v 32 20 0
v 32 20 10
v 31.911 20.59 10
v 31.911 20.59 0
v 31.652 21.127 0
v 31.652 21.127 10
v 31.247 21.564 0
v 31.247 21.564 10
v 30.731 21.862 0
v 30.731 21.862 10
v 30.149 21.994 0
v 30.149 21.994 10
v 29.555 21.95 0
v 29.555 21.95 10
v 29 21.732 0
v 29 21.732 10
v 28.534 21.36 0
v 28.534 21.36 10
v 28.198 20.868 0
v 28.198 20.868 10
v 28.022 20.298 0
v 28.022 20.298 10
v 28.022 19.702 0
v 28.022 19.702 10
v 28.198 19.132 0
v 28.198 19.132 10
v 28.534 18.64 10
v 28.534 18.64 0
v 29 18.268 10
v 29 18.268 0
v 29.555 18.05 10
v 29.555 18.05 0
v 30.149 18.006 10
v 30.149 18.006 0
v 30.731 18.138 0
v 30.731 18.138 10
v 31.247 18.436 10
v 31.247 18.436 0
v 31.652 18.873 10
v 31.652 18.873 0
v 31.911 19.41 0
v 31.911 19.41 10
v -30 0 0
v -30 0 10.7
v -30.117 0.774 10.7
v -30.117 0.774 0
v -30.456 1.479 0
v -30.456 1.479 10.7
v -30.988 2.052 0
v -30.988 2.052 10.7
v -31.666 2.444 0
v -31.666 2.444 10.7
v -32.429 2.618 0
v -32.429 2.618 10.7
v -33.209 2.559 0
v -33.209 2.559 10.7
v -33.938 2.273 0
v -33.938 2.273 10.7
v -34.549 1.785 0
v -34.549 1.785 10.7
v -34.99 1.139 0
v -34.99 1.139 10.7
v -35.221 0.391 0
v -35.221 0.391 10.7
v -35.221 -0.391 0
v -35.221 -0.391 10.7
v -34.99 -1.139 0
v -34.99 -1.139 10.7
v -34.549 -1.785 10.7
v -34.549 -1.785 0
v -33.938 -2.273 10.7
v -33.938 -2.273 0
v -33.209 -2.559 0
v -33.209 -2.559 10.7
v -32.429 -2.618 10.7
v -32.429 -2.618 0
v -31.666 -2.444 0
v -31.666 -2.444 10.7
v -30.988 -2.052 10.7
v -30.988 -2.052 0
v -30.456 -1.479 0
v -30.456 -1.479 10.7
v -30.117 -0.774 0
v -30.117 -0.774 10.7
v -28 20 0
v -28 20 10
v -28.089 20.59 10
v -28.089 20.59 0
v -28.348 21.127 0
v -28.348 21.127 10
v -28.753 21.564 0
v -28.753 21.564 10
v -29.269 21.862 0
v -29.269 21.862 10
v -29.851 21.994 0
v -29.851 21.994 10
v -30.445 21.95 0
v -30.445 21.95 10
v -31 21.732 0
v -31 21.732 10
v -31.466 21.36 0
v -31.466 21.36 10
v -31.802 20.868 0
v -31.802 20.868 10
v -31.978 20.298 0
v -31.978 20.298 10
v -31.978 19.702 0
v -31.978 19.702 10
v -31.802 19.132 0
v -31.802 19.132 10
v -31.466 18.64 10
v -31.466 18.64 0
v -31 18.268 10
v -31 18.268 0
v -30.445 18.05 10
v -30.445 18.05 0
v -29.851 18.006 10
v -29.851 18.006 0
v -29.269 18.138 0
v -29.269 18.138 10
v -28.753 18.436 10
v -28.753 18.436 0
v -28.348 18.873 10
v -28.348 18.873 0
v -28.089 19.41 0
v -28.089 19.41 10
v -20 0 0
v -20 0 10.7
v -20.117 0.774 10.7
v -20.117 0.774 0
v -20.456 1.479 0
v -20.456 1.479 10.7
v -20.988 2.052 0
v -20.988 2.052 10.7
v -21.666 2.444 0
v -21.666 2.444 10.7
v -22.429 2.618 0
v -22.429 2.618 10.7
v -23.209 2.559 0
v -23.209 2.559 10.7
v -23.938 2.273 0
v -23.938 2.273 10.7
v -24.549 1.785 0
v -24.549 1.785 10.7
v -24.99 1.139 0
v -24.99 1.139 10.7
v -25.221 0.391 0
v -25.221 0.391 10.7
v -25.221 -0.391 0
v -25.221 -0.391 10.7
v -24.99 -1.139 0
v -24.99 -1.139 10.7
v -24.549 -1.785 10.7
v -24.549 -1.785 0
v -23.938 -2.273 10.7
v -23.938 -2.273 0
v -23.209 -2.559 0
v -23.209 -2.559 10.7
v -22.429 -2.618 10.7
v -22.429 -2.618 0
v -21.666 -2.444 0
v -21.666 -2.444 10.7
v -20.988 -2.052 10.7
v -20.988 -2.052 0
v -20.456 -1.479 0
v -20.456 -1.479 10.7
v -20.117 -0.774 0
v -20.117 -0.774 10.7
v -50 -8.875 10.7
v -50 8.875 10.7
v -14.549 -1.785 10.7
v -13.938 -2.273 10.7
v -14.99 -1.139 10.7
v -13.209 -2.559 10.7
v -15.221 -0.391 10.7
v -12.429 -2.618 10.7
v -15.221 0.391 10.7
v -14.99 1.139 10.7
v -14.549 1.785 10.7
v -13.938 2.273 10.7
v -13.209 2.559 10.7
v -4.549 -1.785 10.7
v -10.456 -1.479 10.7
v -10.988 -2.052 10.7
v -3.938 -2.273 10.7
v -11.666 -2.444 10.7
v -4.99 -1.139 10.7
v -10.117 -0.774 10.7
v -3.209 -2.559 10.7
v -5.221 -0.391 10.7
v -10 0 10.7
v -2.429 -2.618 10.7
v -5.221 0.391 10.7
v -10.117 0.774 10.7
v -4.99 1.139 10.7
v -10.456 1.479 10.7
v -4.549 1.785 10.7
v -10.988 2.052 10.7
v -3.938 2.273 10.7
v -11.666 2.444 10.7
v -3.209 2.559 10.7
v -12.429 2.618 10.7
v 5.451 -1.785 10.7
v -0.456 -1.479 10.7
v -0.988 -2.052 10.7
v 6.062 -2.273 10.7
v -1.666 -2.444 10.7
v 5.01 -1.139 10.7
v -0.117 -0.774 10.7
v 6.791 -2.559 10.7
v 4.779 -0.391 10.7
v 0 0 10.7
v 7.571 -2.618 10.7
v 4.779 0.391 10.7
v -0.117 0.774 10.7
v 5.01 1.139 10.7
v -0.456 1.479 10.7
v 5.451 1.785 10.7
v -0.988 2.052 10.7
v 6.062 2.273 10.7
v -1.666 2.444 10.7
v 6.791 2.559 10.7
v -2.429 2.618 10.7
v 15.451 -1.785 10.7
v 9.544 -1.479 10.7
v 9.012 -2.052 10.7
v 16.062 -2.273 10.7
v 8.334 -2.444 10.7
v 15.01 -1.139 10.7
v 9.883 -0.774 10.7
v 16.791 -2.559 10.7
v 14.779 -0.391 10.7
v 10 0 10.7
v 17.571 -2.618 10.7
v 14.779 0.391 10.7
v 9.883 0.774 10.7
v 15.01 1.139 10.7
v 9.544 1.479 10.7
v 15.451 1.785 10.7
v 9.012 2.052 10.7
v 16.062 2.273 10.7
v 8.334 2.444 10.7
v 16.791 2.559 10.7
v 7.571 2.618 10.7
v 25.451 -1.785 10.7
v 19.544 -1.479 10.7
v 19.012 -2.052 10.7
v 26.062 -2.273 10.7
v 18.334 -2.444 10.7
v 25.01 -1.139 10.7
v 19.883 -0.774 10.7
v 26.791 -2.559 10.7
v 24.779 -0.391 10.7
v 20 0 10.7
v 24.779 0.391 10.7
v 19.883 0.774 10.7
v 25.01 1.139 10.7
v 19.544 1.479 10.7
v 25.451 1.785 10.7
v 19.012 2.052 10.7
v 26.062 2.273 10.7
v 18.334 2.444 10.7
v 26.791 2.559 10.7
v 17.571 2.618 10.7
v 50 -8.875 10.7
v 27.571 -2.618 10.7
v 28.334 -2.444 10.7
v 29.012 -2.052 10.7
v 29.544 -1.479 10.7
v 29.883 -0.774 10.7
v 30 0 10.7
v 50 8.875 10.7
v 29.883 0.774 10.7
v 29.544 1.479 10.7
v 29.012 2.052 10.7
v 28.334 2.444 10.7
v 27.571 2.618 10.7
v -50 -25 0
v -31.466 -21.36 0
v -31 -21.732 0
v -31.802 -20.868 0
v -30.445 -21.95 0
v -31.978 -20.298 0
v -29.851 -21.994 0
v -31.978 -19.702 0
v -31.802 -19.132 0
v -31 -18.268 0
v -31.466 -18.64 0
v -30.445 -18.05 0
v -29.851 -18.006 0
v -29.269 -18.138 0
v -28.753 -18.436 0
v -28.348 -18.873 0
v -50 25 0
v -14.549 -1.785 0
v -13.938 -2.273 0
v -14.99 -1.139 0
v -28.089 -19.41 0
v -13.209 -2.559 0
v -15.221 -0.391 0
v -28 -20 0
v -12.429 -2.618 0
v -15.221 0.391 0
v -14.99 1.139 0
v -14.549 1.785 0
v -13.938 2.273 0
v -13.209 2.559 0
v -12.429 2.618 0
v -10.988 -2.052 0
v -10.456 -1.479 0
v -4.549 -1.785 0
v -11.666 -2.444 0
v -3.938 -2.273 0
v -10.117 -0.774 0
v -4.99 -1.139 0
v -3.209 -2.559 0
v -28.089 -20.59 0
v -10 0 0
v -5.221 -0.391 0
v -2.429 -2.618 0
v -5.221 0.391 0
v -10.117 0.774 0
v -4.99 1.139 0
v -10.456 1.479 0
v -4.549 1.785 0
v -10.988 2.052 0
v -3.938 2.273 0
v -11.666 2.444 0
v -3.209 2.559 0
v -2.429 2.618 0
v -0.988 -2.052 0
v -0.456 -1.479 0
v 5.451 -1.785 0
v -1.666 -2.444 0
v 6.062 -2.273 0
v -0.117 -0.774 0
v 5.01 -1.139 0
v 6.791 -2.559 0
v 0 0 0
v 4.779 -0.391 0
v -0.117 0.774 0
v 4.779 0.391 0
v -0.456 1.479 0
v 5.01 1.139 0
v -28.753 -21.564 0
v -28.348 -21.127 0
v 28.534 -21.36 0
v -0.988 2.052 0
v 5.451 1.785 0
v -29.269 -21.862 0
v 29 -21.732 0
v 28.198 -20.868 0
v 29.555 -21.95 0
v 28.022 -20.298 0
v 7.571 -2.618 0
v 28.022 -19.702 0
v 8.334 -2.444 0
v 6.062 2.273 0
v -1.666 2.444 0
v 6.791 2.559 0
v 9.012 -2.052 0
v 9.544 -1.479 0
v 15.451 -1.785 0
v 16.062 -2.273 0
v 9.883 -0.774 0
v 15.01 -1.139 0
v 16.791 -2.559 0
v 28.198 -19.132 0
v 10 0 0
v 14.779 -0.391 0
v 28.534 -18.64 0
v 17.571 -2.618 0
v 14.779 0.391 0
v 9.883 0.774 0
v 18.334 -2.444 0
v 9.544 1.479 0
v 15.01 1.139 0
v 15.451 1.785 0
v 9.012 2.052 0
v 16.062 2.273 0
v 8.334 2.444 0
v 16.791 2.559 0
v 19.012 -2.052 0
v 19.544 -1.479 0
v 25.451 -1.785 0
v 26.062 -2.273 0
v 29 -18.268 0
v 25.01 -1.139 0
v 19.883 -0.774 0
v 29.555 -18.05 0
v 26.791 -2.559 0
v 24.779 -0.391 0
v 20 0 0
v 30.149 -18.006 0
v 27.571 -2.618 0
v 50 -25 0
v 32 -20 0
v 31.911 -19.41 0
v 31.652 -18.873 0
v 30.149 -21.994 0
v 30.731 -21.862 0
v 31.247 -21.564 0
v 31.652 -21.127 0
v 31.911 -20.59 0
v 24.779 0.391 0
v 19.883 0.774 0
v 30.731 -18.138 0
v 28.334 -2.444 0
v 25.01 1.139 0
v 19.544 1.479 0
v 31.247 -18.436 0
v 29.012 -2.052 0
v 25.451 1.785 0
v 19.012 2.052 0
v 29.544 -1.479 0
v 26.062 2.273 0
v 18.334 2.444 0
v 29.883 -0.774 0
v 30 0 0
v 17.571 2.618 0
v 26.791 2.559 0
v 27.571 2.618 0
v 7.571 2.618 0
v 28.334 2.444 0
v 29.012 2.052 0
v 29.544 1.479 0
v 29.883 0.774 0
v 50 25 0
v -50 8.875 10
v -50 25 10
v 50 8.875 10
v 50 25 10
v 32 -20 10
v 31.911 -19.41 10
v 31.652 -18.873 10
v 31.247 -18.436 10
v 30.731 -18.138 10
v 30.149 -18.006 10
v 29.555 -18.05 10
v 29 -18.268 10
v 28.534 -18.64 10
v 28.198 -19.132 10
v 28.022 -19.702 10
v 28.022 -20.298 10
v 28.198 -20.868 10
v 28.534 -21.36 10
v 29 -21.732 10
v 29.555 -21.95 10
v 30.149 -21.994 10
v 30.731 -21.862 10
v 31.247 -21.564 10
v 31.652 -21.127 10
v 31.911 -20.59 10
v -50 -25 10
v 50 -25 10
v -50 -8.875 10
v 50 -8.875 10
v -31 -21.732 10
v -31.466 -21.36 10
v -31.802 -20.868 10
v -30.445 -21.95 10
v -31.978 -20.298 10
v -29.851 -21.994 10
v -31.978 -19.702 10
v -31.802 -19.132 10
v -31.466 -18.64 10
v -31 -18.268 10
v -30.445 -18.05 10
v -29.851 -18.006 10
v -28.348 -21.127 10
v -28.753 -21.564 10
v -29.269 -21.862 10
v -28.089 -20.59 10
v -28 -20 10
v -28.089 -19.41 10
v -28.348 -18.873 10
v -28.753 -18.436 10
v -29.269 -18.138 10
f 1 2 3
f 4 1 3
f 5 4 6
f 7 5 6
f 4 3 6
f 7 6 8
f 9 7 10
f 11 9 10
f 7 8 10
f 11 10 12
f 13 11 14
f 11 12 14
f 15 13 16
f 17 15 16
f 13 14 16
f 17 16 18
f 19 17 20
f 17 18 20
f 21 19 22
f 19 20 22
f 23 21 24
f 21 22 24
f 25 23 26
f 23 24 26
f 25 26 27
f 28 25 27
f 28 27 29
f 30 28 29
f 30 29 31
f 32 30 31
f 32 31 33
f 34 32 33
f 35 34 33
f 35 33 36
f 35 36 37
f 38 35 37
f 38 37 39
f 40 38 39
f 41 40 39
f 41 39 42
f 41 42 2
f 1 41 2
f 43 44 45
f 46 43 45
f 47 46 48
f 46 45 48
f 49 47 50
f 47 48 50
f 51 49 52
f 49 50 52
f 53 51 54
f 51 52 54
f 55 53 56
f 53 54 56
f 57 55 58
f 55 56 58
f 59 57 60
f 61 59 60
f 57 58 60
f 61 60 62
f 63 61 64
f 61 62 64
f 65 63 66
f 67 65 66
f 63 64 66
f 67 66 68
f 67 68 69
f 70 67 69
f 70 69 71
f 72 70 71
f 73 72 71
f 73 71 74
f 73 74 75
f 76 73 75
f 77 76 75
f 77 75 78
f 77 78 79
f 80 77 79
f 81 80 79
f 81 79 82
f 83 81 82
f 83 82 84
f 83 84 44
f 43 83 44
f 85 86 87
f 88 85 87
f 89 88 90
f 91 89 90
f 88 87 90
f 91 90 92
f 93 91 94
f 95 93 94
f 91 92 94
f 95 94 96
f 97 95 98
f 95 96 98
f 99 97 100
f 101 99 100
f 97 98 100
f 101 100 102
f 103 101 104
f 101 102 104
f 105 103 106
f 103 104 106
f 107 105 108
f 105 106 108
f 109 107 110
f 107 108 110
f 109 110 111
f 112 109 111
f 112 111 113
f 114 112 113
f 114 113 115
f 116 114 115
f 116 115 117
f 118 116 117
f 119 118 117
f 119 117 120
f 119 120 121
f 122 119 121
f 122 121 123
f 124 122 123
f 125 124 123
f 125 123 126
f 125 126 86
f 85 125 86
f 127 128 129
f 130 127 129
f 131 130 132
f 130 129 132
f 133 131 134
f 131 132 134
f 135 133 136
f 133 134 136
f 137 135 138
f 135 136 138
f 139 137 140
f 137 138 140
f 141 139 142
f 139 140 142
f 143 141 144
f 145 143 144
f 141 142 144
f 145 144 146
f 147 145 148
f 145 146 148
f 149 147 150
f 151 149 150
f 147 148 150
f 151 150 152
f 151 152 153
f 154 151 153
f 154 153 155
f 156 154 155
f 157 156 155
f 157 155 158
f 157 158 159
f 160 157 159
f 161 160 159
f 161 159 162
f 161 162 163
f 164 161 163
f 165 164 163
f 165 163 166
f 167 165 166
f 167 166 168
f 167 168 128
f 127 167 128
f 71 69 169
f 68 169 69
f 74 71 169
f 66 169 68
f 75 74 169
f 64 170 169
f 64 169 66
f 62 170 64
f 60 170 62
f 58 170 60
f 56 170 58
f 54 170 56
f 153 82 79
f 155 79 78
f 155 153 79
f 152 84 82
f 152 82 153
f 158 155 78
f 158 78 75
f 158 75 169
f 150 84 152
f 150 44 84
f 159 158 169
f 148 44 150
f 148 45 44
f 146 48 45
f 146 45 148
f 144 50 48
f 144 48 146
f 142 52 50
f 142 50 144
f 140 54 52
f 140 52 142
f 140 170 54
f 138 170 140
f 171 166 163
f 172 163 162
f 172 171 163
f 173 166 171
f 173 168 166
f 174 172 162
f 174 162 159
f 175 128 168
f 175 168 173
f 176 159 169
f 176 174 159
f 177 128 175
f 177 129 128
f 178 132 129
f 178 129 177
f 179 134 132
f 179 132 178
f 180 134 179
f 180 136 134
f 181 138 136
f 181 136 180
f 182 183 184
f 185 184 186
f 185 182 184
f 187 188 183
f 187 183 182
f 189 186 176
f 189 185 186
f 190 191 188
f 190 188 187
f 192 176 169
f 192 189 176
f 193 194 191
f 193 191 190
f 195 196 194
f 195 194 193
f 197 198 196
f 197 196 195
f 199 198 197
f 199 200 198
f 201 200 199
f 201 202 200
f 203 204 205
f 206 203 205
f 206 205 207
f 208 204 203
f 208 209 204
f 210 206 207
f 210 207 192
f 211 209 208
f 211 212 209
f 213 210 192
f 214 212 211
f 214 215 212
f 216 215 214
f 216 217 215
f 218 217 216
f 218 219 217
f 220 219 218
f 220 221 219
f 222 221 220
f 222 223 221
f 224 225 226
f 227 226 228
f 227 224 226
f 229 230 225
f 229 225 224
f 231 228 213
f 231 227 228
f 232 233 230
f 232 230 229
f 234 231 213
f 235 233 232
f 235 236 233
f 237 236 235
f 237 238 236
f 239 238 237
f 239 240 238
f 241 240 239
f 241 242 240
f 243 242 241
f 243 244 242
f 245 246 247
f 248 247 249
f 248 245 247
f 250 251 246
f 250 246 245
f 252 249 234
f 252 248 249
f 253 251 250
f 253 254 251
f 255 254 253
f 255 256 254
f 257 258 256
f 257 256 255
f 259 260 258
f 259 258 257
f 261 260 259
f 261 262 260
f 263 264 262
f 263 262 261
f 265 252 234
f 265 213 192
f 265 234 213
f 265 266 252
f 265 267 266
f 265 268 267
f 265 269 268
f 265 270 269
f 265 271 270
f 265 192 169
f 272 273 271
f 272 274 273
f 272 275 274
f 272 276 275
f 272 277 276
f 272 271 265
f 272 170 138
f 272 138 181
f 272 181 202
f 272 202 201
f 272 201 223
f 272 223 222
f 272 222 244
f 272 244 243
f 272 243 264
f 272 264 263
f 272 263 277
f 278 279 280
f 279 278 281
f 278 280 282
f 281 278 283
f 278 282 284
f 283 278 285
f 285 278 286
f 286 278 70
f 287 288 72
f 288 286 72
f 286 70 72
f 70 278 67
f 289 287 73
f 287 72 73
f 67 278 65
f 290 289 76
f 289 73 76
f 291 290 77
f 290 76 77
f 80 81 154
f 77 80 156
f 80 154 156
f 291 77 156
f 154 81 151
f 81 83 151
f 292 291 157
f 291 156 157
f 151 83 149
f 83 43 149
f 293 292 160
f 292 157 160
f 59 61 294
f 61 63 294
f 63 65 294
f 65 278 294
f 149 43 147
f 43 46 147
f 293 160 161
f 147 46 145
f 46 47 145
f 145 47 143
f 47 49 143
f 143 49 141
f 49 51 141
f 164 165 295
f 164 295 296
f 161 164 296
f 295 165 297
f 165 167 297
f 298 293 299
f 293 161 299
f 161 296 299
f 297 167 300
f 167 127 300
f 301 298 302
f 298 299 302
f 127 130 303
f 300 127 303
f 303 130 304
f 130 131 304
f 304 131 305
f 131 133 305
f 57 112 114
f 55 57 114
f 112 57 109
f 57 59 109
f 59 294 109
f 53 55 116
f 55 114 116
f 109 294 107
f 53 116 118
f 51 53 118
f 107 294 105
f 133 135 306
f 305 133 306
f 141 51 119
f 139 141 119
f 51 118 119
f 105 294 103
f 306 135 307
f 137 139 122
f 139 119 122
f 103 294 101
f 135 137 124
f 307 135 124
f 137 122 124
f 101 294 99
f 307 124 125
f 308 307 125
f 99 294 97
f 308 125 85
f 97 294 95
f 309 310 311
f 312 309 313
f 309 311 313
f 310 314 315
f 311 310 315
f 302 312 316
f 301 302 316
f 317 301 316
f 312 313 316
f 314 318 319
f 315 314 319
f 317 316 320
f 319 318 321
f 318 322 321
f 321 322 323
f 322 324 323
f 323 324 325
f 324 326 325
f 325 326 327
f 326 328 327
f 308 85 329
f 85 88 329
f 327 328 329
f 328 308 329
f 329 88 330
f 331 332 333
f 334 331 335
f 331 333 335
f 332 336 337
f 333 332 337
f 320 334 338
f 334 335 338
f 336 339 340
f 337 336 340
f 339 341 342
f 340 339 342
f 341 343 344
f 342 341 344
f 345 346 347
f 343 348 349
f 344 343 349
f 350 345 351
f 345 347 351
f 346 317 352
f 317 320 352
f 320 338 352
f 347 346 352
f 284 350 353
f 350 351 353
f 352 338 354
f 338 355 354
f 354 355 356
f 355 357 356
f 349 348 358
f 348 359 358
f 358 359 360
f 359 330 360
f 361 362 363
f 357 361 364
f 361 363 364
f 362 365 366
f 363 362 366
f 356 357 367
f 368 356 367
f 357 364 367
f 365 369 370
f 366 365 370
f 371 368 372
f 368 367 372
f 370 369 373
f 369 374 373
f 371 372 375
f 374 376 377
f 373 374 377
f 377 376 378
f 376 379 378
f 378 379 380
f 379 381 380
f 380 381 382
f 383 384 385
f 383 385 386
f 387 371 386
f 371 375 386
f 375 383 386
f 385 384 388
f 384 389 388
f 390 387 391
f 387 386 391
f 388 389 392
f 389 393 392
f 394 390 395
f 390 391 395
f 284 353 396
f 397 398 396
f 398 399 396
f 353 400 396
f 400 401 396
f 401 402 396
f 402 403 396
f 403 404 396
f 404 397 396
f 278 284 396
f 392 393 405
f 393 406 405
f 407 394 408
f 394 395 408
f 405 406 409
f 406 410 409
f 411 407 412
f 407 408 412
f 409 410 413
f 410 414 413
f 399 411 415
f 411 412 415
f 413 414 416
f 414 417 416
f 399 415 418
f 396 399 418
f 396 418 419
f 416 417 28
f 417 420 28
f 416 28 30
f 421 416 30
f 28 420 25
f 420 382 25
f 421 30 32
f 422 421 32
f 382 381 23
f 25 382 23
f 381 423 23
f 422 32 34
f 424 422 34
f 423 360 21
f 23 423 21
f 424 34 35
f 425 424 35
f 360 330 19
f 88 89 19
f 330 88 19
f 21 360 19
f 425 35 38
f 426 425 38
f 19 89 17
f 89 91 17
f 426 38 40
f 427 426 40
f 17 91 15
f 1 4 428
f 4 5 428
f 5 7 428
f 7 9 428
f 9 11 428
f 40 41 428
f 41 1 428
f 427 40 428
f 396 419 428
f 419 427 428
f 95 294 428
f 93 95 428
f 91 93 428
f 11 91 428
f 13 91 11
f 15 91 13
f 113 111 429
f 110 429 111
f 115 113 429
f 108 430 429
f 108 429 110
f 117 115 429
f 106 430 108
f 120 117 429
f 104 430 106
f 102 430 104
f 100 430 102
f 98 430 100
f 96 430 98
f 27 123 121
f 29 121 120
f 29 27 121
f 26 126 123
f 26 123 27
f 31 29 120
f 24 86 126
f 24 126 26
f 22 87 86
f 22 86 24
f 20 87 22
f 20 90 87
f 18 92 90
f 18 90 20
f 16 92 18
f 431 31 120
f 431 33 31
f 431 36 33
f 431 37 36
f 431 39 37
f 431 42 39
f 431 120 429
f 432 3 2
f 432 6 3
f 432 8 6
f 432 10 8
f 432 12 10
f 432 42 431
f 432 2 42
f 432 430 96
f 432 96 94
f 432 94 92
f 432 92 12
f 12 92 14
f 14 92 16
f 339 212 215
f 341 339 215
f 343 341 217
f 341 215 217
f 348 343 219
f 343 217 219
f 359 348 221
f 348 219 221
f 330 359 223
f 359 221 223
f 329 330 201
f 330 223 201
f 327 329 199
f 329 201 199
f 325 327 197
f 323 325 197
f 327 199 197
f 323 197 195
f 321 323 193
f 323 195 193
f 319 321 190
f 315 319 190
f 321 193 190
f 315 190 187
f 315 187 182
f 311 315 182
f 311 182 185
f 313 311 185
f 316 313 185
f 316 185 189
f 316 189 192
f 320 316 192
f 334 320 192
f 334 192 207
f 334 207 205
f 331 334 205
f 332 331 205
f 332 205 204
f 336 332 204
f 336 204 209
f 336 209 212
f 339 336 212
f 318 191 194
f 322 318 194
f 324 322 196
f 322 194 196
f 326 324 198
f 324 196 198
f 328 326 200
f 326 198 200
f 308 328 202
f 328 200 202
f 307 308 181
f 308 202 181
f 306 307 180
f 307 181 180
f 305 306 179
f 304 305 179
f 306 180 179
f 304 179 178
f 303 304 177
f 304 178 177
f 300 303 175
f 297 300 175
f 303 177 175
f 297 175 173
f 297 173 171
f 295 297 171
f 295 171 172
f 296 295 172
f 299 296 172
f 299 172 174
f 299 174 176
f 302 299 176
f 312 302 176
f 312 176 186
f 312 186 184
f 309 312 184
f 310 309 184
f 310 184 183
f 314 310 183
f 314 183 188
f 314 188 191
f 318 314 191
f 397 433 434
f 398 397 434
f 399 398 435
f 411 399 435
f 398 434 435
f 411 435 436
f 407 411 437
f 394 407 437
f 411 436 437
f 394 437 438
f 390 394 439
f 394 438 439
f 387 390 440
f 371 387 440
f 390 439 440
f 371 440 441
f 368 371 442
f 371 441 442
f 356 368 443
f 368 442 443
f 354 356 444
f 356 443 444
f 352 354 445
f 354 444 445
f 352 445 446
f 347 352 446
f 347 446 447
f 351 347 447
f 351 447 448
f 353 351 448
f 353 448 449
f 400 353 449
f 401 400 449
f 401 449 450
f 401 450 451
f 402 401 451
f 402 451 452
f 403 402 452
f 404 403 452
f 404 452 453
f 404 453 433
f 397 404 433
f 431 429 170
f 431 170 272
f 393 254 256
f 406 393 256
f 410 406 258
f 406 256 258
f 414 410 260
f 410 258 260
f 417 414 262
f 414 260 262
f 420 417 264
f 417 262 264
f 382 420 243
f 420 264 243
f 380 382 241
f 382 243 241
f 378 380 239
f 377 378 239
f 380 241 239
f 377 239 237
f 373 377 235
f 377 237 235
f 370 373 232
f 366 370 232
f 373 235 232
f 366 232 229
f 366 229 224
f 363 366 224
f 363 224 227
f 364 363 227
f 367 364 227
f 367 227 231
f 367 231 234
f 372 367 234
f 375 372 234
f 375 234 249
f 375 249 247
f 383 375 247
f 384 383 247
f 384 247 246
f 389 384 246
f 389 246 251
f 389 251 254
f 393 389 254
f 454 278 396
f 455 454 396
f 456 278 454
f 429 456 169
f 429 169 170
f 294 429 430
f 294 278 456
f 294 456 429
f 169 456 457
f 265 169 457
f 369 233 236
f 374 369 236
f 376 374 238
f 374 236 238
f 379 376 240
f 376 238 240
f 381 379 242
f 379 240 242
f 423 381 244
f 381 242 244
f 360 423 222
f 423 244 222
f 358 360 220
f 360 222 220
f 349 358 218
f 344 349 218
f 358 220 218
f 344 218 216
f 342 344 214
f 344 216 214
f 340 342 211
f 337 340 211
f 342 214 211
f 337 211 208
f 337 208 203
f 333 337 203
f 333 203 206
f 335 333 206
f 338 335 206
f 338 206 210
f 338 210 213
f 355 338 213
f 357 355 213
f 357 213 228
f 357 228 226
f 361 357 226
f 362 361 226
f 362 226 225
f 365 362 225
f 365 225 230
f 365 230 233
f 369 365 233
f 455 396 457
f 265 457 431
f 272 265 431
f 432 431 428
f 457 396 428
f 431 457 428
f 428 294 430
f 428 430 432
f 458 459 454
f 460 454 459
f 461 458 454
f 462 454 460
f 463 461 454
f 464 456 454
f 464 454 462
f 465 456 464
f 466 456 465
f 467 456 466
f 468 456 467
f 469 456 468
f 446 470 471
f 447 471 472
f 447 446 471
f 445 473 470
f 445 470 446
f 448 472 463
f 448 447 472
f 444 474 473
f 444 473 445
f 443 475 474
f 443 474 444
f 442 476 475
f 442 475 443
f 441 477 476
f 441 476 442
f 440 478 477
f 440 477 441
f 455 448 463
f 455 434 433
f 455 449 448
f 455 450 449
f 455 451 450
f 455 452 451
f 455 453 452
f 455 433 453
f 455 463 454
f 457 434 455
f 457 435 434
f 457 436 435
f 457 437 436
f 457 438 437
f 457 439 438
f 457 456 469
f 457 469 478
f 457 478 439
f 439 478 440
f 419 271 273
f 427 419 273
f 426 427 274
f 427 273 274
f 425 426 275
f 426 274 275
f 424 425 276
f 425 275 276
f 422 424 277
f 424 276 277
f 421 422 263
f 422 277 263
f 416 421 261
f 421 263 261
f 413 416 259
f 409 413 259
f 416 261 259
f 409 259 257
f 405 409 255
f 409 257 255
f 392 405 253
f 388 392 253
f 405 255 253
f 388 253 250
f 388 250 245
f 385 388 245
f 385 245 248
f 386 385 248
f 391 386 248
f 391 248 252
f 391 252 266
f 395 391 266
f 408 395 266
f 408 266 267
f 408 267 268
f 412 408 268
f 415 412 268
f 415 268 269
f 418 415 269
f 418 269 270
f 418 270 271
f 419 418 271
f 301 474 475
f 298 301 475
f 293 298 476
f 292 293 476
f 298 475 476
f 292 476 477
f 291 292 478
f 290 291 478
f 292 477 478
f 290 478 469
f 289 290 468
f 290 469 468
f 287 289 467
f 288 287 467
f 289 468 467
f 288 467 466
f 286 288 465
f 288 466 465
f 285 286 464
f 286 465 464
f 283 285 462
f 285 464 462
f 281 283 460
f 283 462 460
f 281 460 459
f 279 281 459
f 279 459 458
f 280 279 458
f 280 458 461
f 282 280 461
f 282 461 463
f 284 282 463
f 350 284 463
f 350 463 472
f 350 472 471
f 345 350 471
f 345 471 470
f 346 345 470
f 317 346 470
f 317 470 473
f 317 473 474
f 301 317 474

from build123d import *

# Parameters (mm, degrees)
SKETCH_W        = 100
SKETCH_H        = 50
PAD_DEPTH       = 10
SKETCH001_R     = 2
POCKET_DEPTH    = 10.001
SKETCH002_W     = 100
SKETCH002_H     = 17.75
PAD001_DEPTH    = 0.7
SKETCH003_R     = 2.625
POCKET001_DEPTH = 10.701


with BuildPart() as part:
    # Sketch → Pad (new body)
    with BuildSketch(Plane.XY):
        Rectangle(SKETCH_W, SKETCH_H)
    extrude(amount=PAD_DEPTH)

    # Sketch001 (on Face6 of Pad) → Pocket (cut, through all)
    with BuildSketch(Plane.XY.offset(10)):
        with Locations((-30, 20)):
            Circle(SKETCH001_R)
        with Locations((-30, -20)):
            Circle(SKETCH001_R)
        with Locations((30, 20)):
            Circle(SKETCH001_R)
        with Locations((30, -20)):
            Circle(SKETCH001_R)
    extrude(amount=-POCKET_DEPTH, mode=Mode.SUBTRACT)

    # Sketch002 (on Face5 of Pocket) → Pad001 (join)
    with BuildSketch(Plane.XY.offset(10)):
        Rectangle(SKETCH002_W, SKETCH002_H)
    extrude(amount=PAD001_DEPTH)

    # Sketch003 (on Face16 of Pad001) → Pocket001 (cut, through all)
    with BuildSketch(Plane.XY.offset(10.7)):
        with Locations((-32.625, 0)):
            Circle(SKETCH003_R)
        with Locations((-22.625, 0)):
            Circle(SKETCH003_R)
        with Locations((-12.625, 0)):
            Circle(SKETCH003_R)
        with Locations((-2.625, 0)):
            Circle(SKETCH003_R)
        with Locations((7.375, 0)):
            Circle(SKETCH003_R)
        with Locations((17.375, 0)):
            Circle(SKETCH003_R)
        with Locations((27.375, 0)):
            Circle(SKETCH003_R)
    extrude(amount=-POCKET001_DEPTH, mode=Mode.SUBTRACT)


solid = part.part
